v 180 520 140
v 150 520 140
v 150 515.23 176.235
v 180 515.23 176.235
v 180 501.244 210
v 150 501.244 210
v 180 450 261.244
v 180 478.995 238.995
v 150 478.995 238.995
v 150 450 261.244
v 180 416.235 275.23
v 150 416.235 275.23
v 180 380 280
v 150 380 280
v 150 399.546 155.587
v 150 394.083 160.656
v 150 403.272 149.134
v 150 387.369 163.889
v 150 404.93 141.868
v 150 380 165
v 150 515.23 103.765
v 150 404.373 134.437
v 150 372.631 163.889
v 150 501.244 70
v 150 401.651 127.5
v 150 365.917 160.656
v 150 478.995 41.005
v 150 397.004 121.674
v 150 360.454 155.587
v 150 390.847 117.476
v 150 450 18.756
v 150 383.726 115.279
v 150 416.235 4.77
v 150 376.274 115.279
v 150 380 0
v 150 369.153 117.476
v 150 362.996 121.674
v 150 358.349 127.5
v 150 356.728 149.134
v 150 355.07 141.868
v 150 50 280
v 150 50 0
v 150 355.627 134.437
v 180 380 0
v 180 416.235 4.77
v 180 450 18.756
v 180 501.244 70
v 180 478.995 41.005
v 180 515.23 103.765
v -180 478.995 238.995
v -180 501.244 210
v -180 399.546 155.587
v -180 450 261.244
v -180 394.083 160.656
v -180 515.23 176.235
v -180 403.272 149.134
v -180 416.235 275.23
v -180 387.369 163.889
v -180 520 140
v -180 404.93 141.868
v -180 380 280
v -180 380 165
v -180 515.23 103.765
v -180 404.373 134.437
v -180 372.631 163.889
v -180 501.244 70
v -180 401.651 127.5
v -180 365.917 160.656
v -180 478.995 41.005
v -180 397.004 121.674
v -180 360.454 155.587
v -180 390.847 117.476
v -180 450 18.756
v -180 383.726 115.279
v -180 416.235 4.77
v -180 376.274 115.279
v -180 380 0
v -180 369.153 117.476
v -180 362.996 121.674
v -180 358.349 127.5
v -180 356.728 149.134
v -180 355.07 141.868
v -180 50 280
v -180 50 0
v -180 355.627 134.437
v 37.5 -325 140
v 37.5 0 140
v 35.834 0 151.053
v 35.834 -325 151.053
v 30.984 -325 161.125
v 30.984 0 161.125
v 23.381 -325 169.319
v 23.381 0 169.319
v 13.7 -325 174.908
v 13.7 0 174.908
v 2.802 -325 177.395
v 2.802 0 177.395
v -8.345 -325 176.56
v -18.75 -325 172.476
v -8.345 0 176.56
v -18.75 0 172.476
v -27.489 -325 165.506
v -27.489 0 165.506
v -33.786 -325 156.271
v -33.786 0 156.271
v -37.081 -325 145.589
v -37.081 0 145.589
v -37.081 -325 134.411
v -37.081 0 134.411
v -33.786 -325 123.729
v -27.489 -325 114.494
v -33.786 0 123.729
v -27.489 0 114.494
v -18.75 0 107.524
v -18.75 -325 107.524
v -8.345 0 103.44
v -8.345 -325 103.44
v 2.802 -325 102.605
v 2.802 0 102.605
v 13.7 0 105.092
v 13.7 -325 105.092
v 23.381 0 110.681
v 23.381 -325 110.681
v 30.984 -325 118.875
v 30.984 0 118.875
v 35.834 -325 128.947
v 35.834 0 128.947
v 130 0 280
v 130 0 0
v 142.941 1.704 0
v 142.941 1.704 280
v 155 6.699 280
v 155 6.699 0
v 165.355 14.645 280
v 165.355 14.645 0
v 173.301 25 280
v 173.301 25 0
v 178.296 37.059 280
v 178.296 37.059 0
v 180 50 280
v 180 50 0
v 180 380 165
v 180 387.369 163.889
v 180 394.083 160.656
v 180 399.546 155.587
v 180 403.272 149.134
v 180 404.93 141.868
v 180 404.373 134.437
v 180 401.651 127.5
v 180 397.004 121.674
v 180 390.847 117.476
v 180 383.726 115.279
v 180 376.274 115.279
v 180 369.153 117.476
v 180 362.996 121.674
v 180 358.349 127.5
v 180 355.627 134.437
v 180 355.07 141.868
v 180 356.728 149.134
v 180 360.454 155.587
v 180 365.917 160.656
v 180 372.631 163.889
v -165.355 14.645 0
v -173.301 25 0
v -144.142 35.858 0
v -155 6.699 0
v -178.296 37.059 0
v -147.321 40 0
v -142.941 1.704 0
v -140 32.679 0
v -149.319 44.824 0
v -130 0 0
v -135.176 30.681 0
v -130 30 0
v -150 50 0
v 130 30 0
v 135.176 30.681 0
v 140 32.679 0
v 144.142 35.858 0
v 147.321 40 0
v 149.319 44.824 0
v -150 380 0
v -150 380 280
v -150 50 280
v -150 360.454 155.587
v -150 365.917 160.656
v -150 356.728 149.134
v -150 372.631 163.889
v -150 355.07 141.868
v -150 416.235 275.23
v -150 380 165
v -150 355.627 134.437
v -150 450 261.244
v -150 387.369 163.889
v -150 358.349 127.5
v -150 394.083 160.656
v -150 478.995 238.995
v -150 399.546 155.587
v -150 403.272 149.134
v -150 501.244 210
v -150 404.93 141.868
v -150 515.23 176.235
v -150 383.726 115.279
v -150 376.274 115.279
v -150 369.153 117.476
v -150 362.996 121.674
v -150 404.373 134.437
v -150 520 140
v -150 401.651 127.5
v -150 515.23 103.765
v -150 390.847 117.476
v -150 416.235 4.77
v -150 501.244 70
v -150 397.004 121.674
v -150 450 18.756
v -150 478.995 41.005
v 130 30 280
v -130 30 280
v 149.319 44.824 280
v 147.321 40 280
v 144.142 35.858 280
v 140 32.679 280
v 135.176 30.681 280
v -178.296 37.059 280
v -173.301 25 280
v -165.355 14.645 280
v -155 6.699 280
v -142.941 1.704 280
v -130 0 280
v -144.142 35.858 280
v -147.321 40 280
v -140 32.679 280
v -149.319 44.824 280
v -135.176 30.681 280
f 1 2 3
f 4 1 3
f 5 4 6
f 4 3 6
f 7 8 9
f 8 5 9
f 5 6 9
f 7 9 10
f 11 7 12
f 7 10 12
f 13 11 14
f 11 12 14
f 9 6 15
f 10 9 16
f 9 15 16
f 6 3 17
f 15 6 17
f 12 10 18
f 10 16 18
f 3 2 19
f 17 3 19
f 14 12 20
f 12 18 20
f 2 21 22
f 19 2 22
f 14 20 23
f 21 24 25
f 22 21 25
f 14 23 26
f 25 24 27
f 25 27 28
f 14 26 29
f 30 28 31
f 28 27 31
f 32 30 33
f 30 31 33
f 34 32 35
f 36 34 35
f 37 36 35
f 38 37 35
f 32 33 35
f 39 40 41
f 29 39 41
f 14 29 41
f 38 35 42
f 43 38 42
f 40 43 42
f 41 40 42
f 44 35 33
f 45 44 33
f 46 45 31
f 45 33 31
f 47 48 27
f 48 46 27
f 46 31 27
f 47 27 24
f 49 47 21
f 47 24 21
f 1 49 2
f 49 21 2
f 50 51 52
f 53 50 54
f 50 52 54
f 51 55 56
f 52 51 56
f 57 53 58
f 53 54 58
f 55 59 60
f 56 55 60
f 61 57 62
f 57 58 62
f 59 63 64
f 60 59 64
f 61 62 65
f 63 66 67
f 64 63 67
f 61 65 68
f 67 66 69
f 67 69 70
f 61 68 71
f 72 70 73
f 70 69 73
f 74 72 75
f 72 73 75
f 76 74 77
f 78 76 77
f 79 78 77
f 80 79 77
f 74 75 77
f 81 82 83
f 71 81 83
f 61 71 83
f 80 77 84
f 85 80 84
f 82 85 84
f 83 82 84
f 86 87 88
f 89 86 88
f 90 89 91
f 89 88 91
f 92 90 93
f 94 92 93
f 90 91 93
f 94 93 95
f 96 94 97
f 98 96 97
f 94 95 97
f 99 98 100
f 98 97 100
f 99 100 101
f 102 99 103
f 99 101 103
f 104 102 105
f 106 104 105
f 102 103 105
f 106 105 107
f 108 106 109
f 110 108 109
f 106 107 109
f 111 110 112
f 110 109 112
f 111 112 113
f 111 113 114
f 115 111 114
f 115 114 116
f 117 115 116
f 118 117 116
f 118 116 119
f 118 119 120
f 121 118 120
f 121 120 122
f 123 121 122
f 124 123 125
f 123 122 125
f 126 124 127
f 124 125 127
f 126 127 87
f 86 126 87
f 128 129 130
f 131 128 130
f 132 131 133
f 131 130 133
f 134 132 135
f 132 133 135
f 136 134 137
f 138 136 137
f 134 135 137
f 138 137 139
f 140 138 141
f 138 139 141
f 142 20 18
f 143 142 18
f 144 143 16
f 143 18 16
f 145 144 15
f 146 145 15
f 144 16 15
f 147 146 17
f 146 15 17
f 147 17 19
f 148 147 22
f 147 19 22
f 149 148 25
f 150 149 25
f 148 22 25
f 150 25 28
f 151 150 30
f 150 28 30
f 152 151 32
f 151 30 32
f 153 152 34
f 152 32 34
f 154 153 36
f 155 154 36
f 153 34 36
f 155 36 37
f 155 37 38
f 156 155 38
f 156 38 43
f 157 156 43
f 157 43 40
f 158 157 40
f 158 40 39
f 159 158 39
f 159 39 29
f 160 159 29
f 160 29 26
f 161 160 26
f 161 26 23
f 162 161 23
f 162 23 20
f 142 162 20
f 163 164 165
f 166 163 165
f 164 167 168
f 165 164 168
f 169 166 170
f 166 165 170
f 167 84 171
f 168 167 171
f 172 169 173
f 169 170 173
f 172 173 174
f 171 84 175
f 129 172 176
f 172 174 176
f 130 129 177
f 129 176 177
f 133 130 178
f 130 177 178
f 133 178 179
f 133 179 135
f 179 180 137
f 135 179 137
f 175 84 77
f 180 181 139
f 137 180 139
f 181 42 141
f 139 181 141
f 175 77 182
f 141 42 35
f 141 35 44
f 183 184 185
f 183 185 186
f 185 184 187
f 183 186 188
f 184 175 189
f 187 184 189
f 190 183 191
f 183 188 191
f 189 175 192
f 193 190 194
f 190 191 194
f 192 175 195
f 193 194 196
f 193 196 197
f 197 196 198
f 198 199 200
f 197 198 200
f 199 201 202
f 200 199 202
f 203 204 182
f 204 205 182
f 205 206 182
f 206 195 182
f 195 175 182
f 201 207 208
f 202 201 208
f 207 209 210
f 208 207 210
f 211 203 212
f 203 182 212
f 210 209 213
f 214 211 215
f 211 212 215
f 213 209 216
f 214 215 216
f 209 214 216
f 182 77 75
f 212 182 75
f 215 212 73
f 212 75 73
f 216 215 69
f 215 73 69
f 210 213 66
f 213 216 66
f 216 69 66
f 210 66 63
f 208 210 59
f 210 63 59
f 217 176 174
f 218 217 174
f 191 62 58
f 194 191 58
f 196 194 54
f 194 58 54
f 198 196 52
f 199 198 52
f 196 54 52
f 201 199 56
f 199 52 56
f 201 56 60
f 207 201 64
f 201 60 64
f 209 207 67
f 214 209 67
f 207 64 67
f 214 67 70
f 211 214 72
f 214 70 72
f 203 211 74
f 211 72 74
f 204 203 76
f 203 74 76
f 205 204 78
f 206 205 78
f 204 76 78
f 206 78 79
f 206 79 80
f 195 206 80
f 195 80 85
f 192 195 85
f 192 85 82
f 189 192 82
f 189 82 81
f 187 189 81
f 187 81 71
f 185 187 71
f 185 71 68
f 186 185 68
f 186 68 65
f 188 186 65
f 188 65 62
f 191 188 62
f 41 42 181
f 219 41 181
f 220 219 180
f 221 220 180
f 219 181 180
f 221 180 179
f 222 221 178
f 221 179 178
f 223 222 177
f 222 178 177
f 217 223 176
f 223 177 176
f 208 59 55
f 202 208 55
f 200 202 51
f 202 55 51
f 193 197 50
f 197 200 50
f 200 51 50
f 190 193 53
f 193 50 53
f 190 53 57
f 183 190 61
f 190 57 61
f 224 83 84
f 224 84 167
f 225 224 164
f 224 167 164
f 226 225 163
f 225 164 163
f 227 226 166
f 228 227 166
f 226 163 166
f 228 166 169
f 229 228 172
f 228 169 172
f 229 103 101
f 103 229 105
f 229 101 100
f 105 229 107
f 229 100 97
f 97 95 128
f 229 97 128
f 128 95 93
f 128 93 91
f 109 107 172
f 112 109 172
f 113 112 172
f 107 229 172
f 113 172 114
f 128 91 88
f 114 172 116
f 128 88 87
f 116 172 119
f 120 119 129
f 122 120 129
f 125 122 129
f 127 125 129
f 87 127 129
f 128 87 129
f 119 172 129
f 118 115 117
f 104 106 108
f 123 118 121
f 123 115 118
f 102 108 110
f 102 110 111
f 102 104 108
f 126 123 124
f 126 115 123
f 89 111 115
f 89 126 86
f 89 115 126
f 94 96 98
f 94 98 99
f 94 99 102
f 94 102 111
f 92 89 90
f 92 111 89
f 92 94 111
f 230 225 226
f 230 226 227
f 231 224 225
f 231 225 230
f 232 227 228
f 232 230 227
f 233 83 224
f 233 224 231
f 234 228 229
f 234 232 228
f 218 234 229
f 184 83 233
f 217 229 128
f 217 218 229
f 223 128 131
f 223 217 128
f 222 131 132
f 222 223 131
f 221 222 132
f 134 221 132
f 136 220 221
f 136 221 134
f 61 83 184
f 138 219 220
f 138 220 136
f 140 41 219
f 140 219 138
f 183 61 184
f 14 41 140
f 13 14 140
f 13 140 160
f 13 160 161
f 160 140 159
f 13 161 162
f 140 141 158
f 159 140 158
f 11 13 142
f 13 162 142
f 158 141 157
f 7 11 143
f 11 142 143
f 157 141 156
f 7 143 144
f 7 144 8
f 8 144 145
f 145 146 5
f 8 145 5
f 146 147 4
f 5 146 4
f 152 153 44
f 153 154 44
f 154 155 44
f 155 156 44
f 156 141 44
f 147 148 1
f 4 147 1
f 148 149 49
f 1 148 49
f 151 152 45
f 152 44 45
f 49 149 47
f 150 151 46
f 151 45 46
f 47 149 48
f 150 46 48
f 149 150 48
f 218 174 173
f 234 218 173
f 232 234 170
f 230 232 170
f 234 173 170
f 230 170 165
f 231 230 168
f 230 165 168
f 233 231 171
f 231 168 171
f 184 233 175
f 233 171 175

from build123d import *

# Parameters (mm, degrees)
BOSS_EXTRUDE1_DEPTH     = 280
SKETCH2_R               = 25
CUT_EXTRUDE3_DEPTH      = 1
CUT_EXTRUDE3_DEPTH_BACK = 399
SKETCH4_R               = 37.5
BOSS_EXTRUDE2_DEPTH     = 325


with BuildPart() as part:
    # Sketch1 → Boss-Extrude1 (new body)
    with BuildSketch(Plane.XY):
        with BuildLine():
            Line((-130, 0), (130, 0))
            ThreePointArc((130, 0), (165.355339059, 14.644660941), (180, 50))
            Line((180, 50), (180, 520))
            Line((180, 520), (150, 520))
            Line((150, 520), (150, 50))
            ThreePointArc((150, 50), (144.142135624, 35.857864376), (130, 30))
            Line((130, 30), (-130, 30))
            ThreePointArc((-130, 30), (-144.142135624, 35.857864376), (-150, 50))
            Line((-150, 50), (-150, 520))
            Line((-150, 520), (-180, 520))
            Line((-180, 520), (-180, 50))
            ThreePointArc((-180, 50), (-165.355339059, 14.644660941), (-130, 0))
        make_face()
    extrude(amount=BOSS_EXTRUDE1_DEPTH)

    # Sketch2 → Cut-Extrude3 (cut, two sides)
    with BuildSketch(Plane.ZY.offset(180)) as cut_extrude3_sk:
        with BuildLine():
            Line((280, 520), (140, 520))
            ThreePointArc((140, 520), (238.994949366, 478.994949366), (280, 380))
            Line((280, 380), (280, 520))
        make_face()
        with BuildLine():
            Line((0, 520), (0, 380))
            ThreePointArc((0, 380), (41.005050634, 478.994949366), (140, 520))
            Line((140, 520), (0, 520))
        make_face()
        with Locations((140, 380)):
            Circle(SKETCH2_R)
    extrude(amount=CUT_EXTRUDE3_DEPTH, mode=Mode.SUBTRACT)
    extrude(cut_extrude3_sk.sketch, amount=-CUT_EXTRUDE3_DEPTH_BACK, mode=Mode.SUBTRACT)

    # Sketch4 → Boss-Extrude2 (add)
    with BuildSketch(Plane.XZ):
        with Locations((0, 140)):
            Circle(SKETCH4_R)
    extrude(amount=BOSS_EXTRUDE2_DEPTH)


solid = part.part
